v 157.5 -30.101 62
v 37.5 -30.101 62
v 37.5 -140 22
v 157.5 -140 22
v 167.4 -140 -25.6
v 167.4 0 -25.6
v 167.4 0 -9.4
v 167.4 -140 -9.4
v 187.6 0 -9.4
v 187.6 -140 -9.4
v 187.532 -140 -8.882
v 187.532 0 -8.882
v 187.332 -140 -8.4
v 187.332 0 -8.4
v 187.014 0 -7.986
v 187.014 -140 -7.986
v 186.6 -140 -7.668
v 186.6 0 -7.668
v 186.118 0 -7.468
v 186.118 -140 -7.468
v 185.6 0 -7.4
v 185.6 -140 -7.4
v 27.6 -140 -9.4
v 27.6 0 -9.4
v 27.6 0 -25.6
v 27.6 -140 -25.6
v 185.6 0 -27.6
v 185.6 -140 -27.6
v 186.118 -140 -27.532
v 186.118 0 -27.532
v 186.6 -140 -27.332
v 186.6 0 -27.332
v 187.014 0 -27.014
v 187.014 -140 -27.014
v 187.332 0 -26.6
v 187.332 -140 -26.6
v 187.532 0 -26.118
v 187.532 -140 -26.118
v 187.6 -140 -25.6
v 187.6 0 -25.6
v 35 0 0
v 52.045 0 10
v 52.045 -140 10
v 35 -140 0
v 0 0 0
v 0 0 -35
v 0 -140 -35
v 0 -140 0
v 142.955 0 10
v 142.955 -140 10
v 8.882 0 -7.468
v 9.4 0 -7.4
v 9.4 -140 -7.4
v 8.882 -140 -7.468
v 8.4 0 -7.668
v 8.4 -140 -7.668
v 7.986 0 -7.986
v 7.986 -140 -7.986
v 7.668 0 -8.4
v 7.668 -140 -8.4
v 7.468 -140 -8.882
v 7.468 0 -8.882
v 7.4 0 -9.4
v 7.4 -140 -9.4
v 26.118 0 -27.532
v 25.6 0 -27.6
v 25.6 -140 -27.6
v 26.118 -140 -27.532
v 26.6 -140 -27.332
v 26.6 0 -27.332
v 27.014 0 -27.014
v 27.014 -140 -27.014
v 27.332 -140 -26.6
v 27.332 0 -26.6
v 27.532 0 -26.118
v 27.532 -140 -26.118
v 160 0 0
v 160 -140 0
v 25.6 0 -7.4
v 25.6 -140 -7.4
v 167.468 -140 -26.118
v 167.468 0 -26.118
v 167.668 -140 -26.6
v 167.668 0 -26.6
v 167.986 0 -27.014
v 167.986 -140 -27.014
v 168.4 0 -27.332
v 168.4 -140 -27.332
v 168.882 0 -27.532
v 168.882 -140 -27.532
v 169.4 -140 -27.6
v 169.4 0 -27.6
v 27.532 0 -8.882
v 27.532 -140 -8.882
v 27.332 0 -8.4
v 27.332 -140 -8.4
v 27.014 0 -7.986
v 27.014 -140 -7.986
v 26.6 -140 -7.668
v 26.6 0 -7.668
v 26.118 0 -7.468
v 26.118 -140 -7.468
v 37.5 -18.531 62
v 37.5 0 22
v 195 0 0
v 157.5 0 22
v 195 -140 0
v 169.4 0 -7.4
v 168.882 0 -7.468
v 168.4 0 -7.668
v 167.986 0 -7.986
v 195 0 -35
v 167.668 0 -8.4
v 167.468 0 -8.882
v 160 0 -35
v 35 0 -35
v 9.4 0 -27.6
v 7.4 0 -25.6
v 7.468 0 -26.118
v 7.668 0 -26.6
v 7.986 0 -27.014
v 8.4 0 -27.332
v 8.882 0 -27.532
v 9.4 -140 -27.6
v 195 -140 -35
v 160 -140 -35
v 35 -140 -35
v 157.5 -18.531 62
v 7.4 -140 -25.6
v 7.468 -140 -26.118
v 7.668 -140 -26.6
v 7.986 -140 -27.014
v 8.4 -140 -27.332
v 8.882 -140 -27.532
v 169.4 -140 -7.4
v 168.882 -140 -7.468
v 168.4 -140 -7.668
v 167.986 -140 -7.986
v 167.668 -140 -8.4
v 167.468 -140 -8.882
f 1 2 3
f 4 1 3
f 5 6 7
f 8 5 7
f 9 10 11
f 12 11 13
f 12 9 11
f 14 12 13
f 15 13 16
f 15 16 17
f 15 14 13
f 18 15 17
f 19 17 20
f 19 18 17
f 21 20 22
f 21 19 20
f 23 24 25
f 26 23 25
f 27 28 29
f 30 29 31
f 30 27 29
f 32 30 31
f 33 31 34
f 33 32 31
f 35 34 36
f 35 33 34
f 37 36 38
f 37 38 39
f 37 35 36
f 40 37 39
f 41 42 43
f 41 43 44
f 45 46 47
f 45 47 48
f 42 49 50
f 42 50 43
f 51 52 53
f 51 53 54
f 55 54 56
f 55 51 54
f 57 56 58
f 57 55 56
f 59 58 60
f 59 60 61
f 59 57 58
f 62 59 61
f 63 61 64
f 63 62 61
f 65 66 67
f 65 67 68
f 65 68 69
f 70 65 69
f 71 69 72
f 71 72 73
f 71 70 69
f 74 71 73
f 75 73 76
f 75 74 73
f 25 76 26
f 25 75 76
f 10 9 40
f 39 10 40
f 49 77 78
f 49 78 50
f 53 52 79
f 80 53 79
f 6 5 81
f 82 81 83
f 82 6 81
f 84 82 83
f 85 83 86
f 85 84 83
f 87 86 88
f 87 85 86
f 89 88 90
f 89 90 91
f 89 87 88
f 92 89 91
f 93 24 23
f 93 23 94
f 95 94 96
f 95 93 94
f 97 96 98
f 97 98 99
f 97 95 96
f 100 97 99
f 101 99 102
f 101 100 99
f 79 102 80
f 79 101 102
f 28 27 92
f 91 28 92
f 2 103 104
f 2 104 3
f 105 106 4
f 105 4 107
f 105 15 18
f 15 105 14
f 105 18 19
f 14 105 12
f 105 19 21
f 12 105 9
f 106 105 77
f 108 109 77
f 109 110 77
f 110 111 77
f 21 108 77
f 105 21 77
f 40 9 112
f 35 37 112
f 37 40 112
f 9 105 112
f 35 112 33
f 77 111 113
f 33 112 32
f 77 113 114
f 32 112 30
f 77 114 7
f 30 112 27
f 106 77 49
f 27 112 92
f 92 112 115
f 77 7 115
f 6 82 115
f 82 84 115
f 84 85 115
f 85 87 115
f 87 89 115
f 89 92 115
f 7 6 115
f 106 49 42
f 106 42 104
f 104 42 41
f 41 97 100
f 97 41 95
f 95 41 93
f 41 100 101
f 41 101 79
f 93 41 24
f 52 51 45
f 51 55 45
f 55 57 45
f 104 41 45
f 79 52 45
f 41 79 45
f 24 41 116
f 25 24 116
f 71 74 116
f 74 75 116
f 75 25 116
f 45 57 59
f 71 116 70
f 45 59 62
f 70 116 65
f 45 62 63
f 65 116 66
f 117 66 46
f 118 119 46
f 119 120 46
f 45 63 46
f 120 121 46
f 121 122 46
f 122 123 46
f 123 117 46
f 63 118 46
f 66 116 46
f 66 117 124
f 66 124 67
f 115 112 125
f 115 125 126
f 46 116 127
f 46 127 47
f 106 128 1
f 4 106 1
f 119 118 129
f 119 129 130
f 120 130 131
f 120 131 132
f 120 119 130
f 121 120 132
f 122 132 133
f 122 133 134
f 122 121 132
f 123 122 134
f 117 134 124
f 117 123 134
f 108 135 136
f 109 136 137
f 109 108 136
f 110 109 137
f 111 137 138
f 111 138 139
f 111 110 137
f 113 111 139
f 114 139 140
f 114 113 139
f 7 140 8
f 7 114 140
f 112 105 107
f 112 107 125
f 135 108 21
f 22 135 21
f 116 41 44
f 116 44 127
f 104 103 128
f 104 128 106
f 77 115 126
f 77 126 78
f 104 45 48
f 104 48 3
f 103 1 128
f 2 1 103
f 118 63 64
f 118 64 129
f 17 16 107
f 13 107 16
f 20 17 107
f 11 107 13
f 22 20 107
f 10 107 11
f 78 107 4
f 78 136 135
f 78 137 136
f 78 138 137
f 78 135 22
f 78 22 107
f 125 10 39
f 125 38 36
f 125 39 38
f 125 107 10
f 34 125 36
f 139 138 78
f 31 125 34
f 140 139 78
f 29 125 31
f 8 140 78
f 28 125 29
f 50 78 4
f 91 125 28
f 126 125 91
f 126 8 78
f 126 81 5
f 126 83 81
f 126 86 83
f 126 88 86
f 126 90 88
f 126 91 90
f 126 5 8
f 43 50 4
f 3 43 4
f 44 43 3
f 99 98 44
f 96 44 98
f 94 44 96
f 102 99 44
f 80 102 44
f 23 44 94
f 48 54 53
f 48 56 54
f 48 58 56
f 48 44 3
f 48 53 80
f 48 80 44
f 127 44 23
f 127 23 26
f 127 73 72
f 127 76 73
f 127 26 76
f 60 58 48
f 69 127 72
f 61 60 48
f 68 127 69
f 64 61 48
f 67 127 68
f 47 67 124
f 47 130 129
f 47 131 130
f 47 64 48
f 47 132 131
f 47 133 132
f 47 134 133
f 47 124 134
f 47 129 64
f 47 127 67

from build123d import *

# Parameters (mm, degrees)
PAD_DEPTH    = 140
SKETCH001_W  = 120
SKETCH001_H  = 140
PAD001_DEPTH = 40
POCKET_DEPTH = 157.501


with BuildPart() as part:
    # Sketch → Pad (new body)
    with BuildSketch(Plane.XZ):
        Polygon((0, 0), (37.5, 22), (157.5, 22), (195, 0), (195, -35), (160, -35), (160, 0), (142.954545, 10), (52.045455, 10), (35, 0), (35, -35), (0, -35), align=None)
        with BuildLine():
            Line((7.400011, -9.4), (7.400011, -25.6))
            ThreePointArc((7.400011, -25.6), (7.985793, -27.01421), (9.4, -27.6))
            Line((9.4, -27.6), (25.6, -27.6))
            ThreePointArc((25.6, -27.6), (27.014214, -27.014214), (27.6, -25.6))
            Line((27.6, -9.4), (27.6, -25.6))
            ThreePointArc((27.6, -9.4), (27.014214, -7.985786), (25.6, -7.4))
            Line((9.4, -7.4), (25.6, -7.4))
            ThreePointArc((9.4, -7.4), (7.985793, -7.98579), (7.400011, -9.4))
        make_face(mode=Mode.SUBTRACT)
        with BuildLine():
            Line((169.4, -7.4), (185.6, -7.4))
            ThreePointArc((187.6, -9.4), (187.014214, -7.985786), (185.6, -7.4))
            Line((187.6, -9.4), (187.6, -25.6))
            ThreePointArc((185.6, -27.6), (187.014214, -27.014214), (187.6, -25.6))
            Line((185.6, -27.6), (169.4, -27.6))
            ThreePointArc((167.4, -25.6), (167.985786, -27.014214), (169.4, -27.6))
            Line((167.4, -25.6), (167.4, -9.4))
            ThreePointArc((169.4, -7.4), (167.985786, -7.985786), (167.4, -9.4))
        make_face(mode=Mode.SUBTRACT)
    extrude(amount=PAD_DEPTH)

    # Sketch001 (on Face2 of Pad) → Pad001 (join)
    with BuildSketch(Plane(origin=(0, 0, 22), x_dir=(-1, 0, 0), z_dir=(0, 0, 1))):
        with Locations((-97.5, 70)):
            Rectangle(SKETCH001_W, SKETCH001_H)
    extrude(amount=PAD001_DEPTH)

    # Sketch002 (on Face3 of Pad001) → Pocket (cut, through all)
    with BuildSketch(Plane(origin=(37.5, 0, 0), x_dir=(0, 0, -1), z_dir=(-1, 0, 0))):
        Polygon((-62, 30.100903), (-22, 140), (-62, 140), align=None)
        Polygon((-22, 0), (-62, 0), (-62, 18.531311), align=None)
    extrude(amount=-POCKET_DEPTH, mode=Mode.SUBTRACT)


solid = part.part
